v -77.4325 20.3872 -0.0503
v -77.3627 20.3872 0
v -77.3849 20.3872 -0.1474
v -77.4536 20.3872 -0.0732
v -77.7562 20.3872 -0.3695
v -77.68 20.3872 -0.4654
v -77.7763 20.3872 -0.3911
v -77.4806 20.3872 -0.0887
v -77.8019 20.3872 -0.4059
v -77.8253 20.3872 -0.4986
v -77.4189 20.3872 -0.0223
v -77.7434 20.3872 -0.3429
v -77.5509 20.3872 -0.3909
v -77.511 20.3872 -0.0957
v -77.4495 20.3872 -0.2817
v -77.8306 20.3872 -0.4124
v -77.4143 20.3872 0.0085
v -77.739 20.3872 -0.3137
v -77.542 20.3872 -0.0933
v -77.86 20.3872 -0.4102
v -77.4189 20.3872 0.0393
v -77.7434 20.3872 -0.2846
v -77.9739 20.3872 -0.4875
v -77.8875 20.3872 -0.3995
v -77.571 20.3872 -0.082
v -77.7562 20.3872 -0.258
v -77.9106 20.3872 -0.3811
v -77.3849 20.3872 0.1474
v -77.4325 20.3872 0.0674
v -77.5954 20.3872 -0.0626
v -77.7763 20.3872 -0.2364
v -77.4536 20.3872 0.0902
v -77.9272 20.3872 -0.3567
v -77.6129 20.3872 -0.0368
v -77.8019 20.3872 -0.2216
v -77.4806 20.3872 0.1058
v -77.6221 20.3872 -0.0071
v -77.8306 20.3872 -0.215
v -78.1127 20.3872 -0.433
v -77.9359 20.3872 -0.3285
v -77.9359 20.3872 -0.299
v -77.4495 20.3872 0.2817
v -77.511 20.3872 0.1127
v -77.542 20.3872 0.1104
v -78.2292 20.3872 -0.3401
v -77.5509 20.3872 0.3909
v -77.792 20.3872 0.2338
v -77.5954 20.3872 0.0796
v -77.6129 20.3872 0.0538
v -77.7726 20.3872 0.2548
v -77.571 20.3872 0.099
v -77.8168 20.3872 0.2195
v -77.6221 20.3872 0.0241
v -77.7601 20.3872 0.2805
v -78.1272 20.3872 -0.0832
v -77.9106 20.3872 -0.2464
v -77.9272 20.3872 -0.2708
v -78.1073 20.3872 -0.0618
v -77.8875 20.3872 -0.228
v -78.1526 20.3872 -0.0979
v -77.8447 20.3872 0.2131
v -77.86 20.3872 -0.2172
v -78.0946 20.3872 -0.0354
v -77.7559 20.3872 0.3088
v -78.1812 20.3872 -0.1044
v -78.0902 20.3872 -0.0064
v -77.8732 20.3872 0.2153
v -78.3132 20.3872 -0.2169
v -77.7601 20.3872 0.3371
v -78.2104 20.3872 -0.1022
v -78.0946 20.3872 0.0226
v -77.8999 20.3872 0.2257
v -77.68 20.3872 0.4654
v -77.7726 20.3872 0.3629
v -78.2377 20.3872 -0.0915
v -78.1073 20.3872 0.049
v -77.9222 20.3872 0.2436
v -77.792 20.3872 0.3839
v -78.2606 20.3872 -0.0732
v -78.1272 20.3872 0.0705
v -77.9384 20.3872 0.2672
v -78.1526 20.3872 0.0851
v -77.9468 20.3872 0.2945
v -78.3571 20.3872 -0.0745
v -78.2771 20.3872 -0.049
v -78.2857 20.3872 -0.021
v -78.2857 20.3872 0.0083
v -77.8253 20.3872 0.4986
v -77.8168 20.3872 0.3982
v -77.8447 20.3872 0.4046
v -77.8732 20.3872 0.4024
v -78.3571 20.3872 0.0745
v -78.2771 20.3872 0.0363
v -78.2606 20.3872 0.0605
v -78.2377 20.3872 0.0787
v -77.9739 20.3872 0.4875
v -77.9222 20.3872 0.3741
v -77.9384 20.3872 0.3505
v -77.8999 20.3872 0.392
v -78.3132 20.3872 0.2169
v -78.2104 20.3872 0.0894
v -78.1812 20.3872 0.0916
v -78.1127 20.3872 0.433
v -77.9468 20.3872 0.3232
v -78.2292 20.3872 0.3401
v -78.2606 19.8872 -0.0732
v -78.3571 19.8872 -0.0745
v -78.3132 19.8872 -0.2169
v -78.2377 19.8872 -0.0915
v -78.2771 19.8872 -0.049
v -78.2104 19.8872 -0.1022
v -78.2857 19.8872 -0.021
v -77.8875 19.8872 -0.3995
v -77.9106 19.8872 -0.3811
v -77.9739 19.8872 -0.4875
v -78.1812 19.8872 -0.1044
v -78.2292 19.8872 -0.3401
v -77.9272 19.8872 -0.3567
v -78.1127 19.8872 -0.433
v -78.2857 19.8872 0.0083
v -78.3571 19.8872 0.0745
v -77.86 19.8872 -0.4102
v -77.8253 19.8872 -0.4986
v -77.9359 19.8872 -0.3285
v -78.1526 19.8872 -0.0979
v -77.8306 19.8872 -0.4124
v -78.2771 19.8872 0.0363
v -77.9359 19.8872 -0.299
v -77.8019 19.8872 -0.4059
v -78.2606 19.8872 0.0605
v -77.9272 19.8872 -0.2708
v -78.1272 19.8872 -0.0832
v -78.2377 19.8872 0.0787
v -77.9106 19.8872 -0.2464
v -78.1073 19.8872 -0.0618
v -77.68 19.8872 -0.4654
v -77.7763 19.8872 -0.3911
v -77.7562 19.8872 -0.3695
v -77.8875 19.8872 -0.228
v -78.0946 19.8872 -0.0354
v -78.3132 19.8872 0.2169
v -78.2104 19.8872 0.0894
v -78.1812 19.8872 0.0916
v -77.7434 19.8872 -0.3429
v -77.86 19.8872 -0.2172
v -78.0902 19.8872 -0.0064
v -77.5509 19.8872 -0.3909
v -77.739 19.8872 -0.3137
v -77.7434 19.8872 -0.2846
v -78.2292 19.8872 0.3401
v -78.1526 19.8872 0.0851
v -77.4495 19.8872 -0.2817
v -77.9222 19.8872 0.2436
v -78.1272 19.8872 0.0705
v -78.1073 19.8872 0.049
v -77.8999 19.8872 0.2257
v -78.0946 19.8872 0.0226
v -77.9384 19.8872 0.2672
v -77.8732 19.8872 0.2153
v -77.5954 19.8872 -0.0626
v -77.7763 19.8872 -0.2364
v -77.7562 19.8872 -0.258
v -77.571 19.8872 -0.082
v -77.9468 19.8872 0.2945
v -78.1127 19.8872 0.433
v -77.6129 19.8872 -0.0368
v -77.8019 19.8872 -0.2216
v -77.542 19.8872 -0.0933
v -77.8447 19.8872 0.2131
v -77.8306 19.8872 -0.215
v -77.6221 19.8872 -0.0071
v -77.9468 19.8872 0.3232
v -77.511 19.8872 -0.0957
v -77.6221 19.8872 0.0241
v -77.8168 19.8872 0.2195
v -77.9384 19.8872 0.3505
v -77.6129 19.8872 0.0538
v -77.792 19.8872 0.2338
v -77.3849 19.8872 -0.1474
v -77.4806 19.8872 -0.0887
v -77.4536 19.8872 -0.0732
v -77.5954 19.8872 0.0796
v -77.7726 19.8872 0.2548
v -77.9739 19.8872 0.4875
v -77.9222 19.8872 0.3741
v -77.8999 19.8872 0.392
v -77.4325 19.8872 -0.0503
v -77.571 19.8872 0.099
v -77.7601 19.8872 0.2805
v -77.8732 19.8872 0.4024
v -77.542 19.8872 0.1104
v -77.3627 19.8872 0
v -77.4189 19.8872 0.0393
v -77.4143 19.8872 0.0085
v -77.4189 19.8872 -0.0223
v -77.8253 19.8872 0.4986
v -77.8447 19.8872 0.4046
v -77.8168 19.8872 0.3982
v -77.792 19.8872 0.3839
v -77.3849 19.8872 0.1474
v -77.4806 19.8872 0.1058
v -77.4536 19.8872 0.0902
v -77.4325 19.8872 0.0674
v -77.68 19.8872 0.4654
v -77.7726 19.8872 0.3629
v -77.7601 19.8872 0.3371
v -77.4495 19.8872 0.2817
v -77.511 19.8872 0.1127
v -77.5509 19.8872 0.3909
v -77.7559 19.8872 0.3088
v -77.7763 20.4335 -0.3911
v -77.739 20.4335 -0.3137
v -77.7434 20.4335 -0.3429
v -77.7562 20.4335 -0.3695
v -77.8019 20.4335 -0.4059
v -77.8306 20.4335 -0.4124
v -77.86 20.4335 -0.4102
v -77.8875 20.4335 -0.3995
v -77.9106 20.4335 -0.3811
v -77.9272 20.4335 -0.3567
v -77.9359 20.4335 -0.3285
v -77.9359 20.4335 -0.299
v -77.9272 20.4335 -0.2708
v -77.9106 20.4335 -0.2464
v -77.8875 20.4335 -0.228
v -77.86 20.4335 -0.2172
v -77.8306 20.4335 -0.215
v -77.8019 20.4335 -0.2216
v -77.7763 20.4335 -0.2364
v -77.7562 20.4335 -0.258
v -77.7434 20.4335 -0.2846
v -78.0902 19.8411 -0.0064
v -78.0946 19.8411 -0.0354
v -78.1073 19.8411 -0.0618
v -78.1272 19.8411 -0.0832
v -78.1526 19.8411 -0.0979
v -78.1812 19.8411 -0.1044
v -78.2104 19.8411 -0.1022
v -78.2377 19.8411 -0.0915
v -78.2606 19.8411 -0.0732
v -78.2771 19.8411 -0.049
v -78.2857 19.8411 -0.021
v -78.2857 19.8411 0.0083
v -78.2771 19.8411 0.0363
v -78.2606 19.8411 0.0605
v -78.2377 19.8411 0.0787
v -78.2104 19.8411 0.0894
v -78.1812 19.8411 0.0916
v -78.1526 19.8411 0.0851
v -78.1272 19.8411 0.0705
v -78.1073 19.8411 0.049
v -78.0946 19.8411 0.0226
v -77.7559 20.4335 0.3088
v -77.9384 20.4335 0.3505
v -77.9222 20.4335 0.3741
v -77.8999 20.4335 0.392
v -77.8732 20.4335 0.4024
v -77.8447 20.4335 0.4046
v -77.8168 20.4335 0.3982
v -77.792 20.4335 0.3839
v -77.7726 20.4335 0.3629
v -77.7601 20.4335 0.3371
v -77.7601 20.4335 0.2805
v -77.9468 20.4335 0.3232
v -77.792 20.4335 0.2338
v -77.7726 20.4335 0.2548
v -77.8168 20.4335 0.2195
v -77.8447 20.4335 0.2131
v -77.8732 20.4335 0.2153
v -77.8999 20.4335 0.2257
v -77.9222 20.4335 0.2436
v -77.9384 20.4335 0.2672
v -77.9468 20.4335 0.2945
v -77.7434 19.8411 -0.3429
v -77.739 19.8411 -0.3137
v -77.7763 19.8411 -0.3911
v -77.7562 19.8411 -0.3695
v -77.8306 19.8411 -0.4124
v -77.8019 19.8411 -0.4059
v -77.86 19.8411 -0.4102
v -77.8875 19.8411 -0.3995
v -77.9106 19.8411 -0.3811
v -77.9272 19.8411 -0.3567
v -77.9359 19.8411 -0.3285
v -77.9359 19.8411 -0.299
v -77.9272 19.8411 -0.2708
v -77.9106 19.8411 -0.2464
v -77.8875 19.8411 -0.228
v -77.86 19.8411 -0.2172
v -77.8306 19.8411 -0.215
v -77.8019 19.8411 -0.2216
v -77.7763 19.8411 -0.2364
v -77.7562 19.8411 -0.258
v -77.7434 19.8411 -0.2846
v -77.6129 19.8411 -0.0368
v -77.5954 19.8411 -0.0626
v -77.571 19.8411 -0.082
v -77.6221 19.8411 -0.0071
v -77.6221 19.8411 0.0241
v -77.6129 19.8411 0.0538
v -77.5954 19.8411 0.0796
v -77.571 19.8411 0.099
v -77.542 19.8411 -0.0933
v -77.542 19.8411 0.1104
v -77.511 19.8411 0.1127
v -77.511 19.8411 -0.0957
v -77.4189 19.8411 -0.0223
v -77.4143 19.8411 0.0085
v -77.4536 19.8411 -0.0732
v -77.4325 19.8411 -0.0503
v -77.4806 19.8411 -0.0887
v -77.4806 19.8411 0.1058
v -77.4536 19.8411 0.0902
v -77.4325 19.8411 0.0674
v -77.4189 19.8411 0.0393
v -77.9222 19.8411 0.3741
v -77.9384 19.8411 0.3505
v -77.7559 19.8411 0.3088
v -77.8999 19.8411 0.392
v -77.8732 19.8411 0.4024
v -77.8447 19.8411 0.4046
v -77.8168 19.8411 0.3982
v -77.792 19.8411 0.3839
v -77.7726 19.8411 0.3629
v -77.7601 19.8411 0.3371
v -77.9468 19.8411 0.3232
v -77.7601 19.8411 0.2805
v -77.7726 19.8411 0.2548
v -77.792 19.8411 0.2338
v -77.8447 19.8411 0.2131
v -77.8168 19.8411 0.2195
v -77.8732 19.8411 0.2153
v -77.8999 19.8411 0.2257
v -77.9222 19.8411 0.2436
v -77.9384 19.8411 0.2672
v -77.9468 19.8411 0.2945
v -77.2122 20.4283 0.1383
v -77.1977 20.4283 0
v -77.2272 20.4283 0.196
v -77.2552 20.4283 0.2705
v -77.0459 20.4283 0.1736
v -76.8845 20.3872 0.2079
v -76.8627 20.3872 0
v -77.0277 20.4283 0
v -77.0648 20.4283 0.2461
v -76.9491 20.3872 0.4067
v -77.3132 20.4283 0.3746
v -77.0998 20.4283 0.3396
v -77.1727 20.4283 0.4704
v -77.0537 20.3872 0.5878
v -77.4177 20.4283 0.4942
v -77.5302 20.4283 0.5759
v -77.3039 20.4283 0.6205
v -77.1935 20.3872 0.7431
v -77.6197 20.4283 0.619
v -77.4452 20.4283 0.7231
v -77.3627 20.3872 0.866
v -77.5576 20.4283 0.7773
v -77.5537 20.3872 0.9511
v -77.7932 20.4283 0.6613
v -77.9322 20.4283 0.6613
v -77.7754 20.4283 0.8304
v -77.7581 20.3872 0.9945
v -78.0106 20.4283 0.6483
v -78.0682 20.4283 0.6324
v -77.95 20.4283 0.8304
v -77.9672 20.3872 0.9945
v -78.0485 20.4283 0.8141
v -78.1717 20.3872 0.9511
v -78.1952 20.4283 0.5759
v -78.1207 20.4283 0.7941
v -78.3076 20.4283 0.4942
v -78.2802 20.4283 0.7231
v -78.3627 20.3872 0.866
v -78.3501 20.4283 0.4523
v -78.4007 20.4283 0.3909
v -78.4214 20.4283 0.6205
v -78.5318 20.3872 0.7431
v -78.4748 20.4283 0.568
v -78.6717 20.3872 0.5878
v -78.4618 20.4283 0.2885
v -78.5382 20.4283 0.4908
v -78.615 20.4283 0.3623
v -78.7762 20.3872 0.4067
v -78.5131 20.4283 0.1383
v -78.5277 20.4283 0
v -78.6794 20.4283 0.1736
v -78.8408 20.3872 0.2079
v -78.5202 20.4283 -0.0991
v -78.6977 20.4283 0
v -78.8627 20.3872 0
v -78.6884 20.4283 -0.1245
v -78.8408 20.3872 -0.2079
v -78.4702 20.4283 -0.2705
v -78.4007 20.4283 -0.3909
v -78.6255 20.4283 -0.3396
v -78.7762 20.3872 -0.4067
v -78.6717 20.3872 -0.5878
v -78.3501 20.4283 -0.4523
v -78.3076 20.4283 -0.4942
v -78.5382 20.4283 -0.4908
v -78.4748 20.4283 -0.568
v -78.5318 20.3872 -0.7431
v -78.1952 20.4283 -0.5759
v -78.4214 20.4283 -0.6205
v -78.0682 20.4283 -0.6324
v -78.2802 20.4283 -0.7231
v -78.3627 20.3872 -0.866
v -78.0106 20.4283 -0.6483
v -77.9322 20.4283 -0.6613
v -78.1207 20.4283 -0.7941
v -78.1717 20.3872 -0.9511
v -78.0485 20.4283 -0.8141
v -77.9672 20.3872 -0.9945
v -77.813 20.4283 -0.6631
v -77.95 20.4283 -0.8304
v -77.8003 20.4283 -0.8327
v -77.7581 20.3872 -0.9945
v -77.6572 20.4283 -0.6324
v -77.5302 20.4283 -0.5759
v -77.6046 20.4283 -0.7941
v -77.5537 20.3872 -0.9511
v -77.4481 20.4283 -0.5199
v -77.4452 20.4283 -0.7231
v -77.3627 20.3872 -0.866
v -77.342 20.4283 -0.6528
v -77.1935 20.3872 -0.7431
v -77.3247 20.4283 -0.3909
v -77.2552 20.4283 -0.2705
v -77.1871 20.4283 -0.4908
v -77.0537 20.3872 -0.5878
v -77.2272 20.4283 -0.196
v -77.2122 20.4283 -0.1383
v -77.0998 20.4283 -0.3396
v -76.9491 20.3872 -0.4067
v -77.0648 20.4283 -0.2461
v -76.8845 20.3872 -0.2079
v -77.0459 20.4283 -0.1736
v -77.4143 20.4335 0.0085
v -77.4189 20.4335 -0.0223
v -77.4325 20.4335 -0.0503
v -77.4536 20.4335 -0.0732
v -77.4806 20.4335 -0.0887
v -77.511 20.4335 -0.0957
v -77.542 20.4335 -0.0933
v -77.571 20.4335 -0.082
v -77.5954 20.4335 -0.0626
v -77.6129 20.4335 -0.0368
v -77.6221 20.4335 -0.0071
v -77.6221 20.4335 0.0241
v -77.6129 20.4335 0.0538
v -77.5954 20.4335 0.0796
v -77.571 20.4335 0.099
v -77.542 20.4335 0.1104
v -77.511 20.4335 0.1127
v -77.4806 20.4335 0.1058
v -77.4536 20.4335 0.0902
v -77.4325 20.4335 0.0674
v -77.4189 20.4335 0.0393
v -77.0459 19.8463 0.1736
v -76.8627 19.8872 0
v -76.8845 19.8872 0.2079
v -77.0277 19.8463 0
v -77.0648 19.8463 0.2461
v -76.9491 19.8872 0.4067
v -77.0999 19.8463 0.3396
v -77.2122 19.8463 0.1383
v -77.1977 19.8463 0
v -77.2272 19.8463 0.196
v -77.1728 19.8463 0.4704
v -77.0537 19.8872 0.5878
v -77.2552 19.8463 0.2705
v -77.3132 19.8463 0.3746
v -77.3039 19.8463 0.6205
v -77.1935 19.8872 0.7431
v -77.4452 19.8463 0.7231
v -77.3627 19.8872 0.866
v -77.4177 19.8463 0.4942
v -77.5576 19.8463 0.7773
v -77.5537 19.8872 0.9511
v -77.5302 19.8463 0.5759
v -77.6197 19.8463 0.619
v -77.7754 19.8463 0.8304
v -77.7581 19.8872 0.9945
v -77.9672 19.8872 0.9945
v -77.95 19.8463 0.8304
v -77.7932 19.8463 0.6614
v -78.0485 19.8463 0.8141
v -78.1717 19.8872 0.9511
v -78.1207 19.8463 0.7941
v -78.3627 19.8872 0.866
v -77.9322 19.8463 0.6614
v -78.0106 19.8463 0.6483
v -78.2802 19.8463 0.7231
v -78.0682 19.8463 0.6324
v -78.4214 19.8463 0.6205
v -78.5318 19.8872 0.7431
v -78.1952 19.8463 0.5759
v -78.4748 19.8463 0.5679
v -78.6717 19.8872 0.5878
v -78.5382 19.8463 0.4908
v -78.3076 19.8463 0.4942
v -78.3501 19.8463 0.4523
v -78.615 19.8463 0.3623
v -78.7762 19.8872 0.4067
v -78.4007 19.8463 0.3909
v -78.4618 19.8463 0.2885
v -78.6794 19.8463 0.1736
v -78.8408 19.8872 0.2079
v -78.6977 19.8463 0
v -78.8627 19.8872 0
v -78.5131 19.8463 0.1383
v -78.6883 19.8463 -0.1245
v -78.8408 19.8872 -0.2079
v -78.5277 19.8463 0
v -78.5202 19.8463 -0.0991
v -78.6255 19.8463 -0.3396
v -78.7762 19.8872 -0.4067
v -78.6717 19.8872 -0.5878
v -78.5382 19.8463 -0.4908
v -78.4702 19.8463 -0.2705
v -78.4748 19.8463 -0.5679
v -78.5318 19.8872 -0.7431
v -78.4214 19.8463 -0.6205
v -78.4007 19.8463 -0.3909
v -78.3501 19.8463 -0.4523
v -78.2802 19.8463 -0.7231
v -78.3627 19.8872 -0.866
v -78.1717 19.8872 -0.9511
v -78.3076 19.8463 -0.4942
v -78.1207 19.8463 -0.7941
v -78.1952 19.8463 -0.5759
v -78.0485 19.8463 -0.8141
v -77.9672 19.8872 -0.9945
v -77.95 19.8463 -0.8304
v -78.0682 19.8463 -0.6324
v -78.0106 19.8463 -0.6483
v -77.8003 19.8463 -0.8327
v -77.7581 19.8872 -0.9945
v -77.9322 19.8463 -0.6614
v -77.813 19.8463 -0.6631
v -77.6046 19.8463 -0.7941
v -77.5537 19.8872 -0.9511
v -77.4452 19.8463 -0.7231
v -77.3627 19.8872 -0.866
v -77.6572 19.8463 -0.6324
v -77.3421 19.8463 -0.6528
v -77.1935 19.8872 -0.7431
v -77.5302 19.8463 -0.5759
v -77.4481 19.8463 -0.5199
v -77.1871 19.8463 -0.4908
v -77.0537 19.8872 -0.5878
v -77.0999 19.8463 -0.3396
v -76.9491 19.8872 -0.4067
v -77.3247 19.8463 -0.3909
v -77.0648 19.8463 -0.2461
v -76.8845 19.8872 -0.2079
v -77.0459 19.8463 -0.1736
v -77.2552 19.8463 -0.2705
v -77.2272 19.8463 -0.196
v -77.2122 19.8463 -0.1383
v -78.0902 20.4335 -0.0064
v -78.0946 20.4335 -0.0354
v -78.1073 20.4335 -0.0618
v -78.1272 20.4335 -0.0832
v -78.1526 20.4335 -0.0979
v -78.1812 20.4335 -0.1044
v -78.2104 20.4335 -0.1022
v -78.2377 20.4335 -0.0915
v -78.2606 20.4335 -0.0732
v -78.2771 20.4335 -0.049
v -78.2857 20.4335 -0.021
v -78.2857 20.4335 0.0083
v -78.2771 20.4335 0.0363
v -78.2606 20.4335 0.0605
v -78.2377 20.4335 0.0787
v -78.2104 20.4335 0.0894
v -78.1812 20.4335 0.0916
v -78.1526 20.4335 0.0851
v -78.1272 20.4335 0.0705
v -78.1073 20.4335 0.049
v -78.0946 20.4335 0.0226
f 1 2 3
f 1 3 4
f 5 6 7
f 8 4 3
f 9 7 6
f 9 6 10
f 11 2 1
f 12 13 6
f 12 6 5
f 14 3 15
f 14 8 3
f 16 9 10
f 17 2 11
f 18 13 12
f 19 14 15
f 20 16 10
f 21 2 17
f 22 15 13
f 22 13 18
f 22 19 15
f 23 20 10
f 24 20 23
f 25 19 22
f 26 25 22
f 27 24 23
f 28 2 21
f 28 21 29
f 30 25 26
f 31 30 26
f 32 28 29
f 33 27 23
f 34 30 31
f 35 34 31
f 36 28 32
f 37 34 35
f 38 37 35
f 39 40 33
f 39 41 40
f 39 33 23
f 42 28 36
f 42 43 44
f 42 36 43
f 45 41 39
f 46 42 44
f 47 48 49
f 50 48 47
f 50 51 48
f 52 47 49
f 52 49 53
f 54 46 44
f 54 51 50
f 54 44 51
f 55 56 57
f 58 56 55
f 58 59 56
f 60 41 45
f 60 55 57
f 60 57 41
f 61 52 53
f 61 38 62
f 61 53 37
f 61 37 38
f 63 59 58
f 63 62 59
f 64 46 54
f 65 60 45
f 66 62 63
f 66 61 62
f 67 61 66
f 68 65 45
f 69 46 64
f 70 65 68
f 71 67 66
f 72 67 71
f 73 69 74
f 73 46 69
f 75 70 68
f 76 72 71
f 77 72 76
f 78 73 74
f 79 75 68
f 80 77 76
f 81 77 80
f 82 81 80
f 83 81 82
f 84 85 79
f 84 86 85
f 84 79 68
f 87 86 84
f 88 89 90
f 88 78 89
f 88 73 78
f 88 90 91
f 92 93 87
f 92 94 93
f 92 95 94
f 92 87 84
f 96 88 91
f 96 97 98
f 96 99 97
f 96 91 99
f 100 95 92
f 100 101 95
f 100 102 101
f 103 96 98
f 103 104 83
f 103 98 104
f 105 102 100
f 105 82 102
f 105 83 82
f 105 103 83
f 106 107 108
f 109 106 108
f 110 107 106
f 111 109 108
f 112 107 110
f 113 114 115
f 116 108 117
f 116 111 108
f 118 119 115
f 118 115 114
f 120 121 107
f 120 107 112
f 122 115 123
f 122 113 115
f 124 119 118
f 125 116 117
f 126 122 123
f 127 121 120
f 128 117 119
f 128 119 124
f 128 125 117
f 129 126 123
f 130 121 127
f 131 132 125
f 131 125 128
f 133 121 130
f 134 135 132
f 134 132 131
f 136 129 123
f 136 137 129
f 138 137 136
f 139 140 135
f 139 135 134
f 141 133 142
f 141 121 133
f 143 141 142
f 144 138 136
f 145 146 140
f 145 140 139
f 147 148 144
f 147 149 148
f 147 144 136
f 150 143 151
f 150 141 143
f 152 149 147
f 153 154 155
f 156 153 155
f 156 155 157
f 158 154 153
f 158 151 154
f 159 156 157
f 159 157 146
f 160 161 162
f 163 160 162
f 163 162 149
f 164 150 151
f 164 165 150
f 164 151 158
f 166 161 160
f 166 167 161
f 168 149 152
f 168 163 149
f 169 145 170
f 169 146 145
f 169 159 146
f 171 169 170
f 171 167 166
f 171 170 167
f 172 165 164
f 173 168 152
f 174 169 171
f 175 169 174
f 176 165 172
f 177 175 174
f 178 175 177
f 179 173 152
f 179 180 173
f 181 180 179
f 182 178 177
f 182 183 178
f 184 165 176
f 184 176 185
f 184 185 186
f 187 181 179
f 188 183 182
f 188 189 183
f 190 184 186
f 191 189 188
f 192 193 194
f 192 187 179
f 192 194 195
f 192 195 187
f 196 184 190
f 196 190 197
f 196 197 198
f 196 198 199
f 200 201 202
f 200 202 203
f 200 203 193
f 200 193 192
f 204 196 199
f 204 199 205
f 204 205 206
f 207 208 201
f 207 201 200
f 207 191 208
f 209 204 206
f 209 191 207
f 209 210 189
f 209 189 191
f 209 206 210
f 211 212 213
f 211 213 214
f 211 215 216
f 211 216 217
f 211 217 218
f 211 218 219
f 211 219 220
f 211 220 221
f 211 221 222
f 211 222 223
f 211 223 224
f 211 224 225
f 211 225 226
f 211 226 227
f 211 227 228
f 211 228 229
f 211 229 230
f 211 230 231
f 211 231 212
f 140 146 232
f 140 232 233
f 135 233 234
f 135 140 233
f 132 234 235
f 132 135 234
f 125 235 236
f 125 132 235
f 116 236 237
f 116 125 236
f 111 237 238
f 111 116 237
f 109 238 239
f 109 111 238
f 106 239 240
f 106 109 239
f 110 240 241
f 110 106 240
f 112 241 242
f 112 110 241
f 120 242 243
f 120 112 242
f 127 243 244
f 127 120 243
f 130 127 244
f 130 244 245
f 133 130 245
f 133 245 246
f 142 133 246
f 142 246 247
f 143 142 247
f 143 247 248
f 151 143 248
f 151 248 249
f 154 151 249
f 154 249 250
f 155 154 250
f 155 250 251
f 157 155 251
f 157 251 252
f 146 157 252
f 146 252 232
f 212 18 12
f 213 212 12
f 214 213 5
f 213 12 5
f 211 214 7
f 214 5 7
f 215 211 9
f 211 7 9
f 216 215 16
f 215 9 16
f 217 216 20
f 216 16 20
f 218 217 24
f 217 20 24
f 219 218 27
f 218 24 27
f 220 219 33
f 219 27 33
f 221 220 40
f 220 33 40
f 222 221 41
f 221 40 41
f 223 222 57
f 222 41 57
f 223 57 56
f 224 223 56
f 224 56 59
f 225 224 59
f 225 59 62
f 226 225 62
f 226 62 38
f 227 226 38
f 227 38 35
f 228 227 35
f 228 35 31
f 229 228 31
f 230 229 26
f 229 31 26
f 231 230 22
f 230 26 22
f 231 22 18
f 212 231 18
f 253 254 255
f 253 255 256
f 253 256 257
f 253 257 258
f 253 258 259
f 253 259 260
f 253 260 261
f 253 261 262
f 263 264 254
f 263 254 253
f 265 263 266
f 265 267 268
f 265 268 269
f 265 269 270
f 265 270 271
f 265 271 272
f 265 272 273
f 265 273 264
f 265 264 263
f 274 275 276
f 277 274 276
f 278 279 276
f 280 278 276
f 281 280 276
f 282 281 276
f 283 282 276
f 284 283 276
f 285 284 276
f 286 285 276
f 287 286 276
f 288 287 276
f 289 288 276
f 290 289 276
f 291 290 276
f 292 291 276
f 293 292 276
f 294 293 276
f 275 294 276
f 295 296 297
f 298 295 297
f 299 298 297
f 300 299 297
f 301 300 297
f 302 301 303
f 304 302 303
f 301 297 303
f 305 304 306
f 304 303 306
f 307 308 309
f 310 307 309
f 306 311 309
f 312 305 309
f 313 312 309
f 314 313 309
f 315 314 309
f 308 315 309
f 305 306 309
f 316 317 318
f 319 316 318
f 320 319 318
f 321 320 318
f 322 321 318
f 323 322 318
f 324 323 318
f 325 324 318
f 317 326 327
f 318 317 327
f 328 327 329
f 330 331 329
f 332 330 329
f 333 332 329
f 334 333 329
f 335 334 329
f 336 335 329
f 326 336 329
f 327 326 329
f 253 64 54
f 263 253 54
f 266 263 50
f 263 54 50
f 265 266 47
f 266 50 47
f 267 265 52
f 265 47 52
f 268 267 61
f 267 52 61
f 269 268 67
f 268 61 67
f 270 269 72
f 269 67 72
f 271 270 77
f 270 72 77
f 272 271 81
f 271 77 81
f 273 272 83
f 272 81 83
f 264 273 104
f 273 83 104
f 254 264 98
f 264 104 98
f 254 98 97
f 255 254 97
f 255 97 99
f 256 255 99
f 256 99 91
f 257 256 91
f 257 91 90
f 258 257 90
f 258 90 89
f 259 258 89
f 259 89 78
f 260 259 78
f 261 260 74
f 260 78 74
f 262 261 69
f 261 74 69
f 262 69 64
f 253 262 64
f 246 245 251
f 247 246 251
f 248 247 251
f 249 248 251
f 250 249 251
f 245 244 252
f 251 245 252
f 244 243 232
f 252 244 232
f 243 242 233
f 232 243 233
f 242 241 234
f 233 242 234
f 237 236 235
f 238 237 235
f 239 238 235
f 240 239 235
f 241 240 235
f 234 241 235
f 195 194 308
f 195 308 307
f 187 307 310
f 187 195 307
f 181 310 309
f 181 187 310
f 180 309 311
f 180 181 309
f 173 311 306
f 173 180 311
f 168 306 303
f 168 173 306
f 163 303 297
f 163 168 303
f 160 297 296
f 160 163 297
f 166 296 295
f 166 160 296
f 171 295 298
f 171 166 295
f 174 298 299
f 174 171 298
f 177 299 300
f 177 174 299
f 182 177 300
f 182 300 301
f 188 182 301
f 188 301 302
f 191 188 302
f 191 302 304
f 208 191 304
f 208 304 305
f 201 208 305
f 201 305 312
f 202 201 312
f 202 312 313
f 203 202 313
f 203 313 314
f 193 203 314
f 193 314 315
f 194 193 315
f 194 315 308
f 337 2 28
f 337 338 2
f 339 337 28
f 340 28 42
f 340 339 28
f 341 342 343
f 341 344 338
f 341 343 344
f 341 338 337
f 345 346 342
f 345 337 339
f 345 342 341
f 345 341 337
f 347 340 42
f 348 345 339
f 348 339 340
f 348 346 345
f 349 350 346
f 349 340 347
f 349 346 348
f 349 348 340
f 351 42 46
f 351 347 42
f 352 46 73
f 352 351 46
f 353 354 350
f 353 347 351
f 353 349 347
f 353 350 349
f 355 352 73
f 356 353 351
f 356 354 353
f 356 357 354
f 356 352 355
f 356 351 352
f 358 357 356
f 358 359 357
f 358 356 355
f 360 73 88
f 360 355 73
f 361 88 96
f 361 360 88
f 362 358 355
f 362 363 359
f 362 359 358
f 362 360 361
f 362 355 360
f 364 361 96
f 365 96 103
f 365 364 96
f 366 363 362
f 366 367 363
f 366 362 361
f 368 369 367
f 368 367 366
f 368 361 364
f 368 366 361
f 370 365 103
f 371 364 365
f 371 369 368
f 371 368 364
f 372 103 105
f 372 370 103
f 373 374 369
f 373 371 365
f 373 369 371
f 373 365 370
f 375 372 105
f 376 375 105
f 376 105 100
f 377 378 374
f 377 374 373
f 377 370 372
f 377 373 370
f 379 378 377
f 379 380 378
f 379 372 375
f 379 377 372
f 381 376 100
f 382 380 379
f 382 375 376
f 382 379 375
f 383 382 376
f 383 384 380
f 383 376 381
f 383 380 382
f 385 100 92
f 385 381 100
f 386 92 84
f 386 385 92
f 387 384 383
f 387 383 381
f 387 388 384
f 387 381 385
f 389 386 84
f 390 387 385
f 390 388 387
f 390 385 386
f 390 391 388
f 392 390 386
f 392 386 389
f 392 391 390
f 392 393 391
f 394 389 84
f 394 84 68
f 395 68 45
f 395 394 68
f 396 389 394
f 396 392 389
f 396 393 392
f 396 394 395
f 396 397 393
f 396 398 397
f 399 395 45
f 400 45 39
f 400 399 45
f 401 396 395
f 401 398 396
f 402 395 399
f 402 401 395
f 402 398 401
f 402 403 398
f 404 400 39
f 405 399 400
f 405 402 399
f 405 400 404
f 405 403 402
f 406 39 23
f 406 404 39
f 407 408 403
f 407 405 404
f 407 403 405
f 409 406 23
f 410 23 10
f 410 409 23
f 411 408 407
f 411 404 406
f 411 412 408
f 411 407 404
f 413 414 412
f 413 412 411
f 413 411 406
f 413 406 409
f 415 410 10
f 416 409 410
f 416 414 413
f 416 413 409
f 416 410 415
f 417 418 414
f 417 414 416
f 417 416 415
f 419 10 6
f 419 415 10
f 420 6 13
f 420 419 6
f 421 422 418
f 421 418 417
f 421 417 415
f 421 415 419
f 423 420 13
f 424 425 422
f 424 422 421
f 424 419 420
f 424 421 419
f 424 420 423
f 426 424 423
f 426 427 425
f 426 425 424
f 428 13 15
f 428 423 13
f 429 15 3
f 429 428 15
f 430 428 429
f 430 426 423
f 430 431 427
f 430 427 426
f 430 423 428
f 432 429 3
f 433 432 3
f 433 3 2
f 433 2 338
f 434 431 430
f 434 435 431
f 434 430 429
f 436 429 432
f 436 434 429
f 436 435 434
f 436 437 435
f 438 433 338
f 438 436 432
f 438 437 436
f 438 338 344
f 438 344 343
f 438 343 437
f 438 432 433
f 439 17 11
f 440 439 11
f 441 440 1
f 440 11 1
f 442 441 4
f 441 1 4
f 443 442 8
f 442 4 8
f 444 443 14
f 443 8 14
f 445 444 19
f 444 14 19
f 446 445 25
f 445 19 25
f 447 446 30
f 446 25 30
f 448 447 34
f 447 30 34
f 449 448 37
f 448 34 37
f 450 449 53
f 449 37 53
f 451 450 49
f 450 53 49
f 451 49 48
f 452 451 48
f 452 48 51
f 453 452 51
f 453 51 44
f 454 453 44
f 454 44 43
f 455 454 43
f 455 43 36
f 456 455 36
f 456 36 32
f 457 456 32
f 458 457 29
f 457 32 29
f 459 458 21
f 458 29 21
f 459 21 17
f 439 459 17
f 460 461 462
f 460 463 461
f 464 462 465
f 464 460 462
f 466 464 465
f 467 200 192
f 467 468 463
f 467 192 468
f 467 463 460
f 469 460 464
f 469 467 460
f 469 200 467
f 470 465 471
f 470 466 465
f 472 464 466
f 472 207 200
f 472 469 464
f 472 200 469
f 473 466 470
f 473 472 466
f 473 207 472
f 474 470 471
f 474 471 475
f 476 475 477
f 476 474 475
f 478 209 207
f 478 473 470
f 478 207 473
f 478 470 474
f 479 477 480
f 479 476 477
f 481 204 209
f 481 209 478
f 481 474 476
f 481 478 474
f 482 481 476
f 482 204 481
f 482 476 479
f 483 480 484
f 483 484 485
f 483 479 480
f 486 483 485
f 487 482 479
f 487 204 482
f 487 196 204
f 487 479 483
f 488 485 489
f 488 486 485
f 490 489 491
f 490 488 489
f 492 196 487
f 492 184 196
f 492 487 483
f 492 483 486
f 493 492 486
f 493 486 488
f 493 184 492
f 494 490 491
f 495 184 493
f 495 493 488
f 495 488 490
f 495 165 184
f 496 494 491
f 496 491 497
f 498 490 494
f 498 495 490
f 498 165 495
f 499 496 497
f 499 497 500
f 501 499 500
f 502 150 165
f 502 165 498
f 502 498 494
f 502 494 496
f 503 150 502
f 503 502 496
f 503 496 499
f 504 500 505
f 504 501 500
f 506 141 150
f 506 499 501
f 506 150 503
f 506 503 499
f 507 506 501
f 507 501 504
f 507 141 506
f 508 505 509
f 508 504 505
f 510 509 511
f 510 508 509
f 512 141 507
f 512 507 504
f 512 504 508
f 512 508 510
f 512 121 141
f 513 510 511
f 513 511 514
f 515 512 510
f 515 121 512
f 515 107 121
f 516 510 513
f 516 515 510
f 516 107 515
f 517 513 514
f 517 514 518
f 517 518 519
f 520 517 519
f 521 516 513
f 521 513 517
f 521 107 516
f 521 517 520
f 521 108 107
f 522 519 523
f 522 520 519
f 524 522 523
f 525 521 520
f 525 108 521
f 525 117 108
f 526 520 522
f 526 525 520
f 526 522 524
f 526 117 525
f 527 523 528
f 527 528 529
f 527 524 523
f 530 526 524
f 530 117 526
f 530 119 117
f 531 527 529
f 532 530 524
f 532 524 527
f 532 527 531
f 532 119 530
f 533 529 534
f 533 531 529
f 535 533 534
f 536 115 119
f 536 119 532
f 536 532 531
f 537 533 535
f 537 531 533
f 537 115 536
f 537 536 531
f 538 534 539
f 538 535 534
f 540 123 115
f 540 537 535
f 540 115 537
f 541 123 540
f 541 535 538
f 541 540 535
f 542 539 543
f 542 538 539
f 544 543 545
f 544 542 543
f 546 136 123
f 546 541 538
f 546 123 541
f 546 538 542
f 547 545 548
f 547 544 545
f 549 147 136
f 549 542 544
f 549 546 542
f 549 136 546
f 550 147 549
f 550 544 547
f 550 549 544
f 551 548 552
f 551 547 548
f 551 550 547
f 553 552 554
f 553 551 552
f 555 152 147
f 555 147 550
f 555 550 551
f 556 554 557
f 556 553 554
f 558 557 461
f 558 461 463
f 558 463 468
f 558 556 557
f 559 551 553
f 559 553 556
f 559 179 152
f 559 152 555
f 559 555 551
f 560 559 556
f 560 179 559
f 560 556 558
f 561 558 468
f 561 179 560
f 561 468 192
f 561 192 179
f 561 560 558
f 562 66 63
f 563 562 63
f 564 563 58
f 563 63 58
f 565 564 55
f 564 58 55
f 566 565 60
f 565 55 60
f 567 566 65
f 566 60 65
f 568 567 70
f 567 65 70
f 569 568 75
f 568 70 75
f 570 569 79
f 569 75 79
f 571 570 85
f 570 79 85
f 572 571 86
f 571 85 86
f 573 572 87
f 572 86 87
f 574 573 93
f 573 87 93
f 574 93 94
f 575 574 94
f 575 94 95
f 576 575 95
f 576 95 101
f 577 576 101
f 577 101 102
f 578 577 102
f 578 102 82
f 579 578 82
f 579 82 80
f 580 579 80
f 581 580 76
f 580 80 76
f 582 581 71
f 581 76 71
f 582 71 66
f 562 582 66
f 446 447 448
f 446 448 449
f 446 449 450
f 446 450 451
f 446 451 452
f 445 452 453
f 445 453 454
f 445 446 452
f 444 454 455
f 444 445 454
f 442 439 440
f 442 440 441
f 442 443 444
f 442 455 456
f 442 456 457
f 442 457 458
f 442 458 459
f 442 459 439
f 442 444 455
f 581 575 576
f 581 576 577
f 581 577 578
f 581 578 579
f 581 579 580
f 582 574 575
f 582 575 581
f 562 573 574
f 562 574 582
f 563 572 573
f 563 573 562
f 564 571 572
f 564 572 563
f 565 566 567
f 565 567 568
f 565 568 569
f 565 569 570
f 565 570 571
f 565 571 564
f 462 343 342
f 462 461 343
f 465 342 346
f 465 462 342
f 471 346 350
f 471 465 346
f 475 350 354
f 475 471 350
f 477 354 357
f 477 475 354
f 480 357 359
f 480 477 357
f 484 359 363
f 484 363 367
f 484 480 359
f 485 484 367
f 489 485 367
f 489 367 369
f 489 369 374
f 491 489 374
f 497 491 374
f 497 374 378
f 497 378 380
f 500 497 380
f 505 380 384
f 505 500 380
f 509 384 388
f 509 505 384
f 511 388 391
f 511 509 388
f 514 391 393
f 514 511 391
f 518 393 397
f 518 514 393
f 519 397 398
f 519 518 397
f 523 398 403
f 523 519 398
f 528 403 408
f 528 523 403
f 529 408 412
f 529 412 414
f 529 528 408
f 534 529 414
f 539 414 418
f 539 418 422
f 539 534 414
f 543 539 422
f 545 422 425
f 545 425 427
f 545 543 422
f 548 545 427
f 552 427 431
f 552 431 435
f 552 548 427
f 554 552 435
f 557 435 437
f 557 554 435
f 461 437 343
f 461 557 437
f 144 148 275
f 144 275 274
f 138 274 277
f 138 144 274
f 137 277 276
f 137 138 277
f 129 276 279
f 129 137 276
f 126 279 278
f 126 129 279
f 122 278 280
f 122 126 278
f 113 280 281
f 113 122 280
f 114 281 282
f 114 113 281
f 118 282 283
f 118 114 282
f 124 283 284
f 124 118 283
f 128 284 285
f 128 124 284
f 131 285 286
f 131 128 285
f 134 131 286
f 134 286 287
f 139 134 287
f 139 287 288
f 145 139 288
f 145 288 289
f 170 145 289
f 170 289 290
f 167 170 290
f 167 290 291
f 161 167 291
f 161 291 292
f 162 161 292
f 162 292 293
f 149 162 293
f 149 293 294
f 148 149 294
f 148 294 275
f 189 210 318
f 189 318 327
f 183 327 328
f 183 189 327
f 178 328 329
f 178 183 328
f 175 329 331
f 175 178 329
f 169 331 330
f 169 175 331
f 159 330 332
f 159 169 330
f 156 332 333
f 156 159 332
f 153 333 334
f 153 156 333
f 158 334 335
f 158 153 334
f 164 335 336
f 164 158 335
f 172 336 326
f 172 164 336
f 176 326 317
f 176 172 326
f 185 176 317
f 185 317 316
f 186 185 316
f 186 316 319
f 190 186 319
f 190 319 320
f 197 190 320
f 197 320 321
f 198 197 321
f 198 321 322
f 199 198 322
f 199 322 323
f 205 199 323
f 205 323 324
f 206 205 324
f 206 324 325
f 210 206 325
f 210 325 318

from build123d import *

# Parameters (mm, degrees)
SKETCH5_R                = 0.098984302
SKETCH5_R_2              = 0.104475871
SKETCH5_R_3              = 0.095992018
SKETCH5_R_4              = 0.098284334
BOSS_EXTRUDE2_DEPTH      = 0.046294
BOSS_EXTRUDE2_DEPTH_BACK = 0.546165


with BuildPart() as part:
    # Sketch4 → Revolve1 (revolve)
    with BuildSketch(Plane.XY):
        with BuildLine():
            Line((-77.862668244, 20.387242407), (-77.362668244, 20.387242407))
            ThreePointArc((-77.362668244, 20.387242407), (-77.112668244, 20.433536252), (-76.862668244, 20.387242407))
            Line((-76.862668244, 20.387242407), (-76.862668244, 19.887242407))
            ThreePointArc((-76.862668244, 19.887242407), (-77.112668244, 19.841077248), (-77.362668244, 19.887242407))
            Line((-77.362668244, 19.887242407), (-77.862668244, 19.887242407))
            Line((-77.862668244, 19.887242407), (-77.862668244, 20.387242407))
        make_face()
    revolve(axis=Axis((-77.862668244, 20.387242407, 0), (0, -1, 0)))

    # Sketch5 → Boss-Extrude2 (add, two sides)
    with BuildSketch(Plane(origin=(0, 20.387242407, 0), x_dir=(1, 0, 0), z_dir=(0, 1, 0))) as boss_extrude2_sk:
        with Locations((-77.838023518, 0.313742014)):
            Circle(SKETCH5_R)
        with Locations((-77.518777636, -0.008508906)):
            Circle(SKETCH5_R_2)
        with Locations((-77.85187015, -0.308843625)):
            Circle(SKETCH5_R_3)
        with Locations((-78.188509353, 0.006386281)):
            Circle(SKETCH5_R_4)
    extrude(amount=BOSS_EXTRUDE2_DEPTH)
    extrude(boss_extrude2_sk.sketch, amount=-BOSS_EXTRUDE2_DEPTH_BACK)


solid = part.part
